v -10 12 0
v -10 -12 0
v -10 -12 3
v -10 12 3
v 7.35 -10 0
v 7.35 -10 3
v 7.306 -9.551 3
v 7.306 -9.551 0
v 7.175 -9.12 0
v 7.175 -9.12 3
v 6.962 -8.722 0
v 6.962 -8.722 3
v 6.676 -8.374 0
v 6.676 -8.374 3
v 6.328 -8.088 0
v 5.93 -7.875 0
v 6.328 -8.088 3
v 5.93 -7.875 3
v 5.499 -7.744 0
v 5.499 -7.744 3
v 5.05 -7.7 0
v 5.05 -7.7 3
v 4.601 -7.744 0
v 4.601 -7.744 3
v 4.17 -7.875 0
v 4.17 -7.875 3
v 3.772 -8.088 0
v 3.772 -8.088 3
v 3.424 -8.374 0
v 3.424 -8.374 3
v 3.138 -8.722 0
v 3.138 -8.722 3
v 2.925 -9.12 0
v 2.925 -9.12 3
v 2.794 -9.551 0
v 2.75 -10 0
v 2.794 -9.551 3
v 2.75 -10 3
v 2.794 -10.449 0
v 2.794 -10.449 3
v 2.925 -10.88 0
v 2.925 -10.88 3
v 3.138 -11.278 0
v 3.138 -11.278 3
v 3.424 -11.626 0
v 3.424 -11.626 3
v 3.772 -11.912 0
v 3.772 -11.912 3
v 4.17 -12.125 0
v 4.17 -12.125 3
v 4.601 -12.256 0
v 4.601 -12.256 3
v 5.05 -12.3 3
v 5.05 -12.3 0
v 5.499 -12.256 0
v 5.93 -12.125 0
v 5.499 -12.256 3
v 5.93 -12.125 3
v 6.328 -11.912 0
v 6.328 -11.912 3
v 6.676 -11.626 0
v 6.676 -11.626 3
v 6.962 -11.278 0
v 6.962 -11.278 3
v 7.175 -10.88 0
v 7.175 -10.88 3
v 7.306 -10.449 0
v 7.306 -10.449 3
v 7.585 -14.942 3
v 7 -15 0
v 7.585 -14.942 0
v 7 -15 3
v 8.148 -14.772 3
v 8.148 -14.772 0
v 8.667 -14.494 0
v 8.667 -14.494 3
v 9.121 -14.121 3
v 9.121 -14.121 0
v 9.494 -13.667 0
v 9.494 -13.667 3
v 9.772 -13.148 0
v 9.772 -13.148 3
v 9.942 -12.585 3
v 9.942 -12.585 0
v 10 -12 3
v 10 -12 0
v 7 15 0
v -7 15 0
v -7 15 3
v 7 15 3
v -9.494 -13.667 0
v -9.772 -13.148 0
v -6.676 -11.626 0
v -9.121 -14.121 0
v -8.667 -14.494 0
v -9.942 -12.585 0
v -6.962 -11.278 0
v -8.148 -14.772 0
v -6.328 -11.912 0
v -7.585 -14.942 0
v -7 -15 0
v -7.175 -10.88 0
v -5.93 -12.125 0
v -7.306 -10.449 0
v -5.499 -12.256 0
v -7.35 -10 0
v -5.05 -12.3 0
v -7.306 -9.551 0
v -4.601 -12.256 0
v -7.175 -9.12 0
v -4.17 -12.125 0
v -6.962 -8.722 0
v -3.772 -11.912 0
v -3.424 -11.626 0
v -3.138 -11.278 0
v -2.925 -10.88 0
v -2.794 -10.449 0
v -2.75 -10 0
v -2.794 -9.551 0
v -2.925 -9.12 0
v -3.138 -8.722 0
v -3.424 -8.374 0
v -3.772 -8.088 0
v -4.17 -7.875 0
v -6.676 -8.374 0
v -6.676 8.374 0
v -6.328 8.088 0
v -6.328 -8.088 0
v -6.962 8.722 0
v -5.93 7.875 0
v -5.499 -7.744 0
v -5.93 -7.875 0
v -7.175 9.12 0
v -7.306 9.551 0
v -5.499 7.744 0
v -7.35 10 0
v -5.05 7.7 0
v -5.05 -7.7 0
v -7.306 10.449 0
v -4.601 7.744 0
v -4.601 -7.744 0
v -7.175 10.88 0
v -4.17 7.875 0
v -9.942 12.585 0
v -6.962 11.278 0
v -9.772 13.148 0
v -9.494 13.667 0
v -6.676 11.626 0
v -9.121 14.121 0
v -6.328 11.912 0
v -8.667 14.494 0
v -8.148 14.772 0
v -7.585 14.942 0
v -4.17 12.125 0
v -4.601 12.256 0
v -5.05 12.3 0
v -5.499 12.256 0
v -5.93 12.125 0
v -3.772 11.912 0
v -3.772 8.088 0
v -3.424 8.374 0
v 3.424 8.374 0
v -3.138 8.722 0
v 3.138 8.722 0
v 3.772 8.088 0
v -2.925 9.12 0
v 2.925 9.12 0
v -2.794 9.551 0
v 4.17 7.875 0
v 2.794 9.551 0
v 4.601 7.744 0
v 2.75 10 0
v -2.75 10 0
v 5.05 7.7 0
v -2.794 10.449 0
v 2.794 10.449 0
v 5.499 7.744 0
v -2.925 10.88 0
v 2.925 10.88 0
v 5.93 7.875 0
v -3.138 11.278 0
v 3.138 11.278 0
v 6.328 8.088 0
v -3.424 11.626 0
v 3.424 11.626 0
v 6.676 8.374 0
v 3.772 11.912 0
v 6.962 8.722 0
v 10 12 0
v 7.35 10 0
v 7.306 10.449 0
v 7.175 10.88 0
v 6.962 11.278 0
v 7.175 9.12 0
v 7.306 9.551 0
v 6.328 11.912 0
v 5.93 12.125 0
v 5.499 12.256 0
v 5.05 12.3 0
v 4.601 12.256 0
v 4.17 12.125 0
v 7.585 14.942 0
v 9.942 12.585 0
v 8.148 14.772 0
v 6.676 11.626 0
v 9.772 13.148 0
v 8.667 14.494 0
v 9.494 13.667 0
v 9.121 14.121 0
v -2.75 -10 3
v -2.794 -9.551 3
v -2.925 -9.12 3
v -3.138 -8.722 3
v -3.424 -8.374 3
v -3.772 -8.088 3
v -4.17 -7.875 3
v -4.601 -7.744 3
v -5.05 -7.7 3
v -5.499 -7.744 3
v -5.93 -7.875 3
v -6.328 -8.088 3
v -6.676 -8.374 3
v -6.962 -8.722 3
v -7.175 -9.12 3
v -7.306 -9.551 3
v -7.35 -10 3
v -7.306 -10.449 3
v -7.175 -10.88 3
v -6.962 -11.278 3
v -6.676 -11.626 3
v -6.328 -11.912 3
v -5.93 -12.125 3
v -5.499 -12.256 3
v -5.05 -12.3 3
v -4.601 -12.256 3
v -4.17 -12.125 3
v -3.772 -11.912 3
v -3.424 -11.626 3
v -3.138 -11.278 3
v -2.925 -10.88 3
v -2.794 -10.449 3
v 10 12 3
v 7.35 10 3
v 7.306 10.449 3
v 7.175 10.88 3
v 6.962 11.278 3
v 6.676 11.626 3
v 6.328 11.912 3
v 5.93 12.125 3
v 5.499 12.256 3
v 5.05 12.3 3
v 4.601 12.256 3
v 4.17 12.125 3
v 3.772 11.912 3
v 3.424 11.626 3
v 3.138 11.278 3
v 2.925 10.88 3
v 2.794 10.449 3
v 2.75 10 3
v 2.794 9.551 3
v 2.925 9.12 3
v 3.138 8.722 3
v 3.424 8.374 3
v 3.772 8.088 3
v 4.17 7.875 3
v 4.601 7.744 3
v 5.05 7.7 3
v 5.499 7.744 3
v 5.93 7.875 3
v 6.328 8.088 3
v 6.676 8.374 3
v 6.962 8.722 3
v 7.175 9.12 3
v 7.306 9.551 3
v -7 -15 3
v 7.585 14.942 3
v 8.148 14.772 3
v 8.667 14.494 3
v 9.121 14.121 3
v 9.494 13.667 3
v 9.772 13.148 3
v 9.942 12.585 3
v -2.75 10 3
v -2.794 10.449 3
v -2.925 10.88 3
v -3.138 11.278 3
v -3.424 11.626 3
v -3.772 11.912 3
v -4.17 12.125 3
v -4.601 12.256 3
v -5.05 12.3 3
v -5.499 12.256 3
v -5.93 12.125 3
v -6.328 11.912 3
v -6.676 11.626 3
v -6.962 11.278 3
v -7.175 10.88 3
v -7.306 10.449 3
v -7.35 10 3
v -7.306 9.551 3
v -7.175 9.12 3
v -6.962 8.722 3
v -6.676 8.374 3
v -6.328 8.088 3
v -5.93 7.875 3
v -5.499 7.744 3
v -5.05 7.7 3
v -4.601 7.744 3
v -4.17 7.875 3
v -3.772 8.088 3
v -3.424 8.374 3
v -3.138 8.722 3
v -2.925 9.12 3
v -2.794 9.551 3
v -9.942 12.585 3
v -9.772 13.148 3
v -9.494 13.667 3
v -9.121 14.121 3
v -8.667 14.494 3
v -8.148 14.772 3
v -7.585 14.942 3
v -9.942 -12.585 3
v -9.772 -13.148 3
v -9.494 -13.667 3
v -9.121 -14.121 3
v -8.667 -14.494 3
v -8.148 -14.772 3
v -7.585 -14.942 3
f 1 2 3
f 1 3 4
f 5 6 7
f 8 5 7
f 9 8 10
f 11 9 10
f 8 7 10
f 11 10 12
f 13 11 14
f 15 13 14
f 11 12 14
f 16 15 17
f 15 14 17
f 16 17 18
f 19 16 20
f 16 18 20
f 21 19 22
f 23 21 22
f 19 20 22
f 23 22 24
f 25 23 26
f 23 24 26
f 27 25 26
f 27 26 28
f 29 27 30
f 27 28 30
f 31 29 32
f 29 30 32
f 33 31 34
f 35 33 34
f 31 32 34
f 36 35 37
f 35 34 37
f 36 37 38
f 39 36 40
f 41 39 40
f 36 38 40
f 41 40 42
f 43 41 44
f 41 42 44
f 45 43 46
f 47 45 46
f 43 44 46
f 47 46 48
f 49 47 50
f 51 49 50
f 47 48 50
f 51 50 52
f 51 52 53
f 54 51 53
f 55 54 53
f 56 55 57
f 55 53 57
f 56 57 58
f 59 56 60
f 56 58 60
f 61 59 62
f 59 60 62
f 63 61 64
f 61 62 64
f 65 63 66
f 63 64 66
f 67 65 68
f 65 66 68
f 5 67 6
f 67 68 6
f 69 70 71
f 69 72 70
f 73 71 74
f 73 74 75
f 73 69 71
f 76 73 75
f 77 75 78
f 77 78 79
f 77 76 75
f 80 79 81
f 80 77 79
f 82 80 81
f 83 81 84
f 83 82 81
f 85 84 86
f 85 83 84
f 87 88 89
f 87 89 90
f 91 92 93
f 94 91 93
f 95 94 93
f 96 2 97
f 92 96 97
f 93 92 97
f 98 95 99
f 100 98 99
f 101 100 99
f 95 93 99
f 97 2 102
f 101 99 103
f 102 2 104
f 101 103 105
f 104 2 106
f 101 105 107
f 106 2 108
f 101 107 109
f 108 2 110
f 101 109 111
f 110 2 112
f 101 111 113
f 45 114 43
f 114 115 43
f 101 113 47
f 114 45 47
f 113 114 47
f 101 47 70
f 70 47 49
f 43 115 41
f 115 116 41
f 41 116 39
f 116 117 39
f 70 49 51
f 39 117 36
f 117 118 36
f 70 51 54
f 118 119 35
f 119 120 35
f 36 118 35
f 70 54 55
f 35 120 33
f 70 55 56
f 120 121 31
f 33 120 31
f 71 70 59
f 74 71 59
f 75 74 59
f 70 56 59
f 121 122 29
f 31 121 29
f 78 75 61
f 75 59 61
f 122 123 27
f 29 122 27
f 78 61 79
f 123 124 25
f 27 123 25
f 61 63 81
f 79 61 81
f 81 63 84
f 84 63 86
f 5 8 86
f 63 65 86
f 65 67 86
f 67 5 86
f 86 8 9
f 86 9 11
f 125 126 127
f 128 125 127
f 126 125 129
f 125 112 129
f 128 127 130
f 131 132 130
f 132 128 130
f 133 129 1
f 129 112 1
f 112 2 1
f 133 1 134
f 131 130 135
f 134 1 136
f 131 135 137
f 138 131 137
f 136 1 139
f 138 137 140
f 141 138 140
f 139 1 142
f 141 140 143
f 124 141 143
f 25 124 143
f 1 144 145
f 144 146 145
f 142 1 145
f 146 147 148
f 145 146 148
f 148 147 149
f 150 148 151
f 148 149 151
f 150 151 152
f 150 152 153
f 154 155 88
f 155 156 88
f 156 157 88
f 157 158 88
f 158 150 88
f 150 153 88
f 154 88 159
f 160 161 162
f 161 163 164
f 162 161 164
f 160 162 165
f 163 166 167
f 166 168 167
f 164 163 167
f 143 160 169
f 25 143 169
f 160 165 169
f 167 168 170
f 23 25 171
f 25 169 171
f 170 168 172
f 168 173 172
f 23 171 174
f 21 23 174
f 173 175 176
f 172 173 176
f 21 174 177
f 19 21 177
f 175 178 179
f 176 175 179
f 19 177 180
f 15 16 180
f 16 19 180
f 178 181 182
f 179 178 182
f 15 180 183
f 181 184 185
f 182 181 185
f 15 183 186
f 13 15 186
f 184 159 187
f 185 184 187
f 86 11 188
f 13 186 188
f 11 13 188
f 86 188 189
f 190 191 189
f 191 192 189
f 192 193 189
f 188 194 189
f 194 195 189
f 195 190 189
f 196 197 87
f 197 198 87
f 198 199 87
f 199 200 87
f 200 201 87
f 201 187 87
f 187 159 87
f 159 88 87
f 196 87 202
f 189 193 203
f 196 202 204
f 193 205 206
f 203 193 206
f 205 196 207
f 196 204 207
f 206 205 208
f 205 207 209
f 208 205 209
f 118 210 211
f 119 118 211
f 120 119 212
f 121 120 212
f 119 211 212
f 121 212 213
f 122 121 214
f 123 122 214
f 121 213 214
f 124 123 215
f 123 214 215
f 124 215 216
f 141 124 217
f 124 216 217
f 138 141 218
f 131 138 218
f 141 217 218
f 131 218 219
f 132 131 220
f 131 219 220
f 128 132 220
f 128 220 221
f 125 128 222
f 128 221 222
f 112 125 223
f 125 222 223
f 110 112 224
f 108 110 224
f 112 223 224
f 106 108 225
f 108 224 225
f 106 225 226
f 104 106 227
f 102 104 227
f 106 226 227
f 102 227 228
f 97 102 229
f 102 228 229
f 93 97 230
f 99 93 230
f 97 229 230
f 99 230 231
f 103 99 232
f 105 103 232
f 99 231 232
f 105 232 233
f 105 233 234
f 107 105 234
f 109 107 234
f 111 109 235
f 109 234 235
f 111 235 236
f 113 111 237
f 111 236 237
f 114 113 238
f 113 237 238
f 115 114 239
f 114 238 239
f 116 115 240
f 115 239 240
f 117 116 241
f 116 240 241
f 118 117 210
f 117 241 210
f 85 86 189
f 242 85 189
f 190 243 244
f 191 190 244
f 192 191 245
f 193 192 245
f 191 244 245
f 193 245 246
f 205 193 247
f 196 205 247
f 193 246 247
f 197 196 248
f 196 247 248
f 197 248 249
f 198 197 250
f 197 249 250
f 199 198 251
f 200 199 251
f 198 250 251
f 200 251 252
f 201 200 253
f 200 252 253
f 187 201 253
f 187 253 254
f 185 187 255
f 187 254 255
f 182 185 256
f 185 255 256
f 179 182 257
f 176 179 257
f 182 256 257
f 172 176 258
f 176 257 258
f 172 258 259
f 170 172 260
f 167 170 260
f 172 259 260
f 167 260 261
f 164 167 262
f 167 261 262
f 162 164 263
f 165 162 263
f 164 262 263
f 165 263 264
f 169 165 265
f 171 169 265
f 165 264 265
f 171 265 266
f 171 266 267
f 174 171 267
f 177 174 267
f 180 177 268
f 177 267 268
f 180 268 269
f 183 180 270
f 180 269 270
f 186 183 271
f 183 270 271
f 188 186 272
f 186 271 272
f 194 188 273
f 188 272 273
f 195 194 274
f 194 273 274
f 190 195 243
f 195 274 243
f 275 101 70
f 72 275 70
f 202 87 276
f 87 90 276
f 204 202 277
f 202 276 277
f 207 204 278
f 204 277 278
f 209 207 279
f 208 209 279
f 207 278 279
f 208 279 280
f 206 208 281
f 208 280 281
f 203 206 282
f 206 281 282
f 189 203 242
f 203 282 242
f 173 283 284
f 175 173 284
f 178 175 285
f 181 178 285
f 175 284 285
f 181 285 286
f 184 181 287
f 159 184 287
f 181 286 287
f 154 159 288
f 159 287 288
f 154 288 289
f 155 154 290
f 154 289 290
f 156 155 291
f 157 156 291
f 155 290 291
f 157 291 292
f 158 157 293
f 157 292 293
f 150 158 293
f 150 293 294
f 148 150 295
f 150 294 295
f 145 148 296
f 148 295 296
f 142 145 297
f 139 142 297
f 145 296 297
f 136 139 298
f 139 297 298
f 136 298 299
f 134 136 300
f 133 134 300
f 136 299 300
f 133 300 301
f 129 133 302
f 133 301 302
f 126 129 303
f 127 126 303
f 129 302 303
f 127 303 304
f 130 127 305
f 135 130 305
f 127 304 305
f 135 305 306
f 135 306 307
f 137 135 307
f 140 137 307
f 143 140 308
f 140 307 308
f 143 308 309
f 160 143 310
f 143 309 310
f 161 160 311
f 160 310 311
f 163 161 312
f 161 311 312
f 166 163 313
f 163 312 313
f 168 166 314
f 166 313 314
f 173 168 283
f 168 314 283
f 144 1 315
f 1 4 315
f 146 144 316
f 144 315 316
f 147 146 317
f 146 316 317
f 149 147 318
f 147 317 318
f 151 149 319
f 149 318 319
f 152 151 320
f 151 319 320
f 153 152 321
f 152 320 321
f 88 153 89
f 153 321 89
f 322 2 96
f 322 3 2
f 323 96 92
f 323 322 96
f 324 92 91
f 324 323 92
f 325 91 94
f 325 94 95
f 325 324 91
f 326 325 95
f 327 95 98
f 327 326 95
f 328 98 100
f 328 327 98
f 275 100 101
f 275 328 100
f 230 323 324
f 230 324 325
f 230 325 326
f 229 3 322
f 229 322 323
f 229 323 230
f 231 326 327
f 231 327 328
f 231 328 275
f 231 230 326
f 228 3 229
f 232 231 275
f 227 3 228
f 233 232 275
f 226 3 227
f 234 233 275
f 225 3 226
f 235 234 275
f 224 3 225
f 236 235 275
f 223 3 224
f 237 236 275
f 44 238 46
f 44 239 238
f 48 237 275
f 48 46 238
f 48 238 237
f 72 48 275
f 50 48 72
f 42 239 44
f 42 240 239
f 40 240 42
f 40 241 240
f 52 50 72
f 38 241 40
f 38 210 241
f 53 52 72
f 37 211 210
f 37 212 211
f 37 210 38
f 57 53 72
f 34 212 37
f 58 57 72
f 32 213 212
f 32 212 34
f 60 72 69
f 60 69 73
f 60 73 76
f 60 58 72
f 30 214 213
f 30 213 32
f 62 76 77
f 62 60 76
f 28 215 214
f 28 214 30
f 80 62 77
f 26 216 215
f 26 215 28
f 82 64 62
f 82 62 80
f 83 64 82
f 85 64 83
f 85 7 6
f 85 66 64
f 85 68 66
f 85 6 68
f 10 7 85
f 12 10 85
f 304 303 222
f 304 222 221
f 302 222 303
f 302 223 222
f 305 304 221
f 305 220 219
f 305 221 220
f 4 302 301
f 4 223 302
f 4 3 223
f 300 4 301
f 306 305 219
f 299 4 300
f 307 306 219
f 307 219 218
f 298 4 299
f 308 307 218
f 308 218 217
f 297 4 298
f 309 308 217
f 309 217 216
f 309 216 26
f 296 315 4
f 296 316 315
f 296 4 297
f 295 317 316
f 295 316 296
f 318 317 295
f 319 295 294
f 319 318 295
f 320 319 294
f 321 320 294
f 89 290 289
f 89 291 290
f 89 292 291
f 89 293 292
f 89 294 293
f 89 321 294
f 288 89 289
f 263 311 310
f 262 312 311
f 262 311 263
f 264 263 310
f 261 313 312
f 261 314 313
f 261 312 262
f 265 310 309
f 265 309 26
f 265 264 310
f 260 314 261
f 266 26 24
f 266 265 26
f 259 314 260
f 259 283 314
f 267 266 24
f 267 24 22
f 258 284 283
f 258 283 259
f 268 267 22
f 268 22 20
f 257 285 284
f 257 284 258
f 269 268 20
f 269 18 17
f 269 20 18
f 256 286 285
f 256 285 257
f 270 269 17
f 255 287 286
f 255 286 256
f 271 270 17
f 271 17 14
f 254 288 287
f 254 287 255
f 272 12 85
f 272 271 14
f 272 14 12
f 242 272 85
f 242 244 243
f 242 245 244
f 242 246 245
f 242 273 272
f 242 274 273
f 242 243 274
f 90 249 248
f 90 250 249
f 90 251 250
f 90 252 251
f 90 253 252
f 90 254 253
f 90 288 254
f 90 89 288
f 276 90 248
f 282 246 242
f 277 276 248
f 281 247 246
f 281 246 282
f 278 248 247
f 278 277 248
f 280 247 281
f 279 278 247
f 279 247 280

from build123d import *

# Parameters (mm, degrees)
SKETCH1_W           = 20
SKETCH1_H           = 30
BOSS_EXTRUDE1_DEPTH = 3
SKETCH2_R           = 2.3
CUT_EXTRUDE1_DEPTH  = 3
FILLET1_R           = 3


with BuildPart() as part:
    # Sketch1 → Boss-Extrude1 (new body)
    with BuildSketch(Plane.XY):
        Rectangle(SKETCH1_W, SKETCH1_H)
    extrude(amount=BOSS_EXTRUDE1_DEPTH)

    # Sketch2 → Cut-Extrude1 (cut)
    with BuildSketch(Plane.XY.offset(3)):
        with Locations((-5.05, 10)):
            Circle(SKETCH2_R)
        with Locations((5.05, 10)):
            Circle(SKETCH2_R)
        with Locations((-5.05, -10)):
            Circle(SKETCH2_R)
        with Locations((5.05, -10)):
            Circle(SKETCH2_R)
    extrude(amount=-CUT_EXTRUDE1_DEPTH, mode=Mode.SUBTRACT)

    # Fillet1
    fillet1_edges = [part.edges().sort_by_distance(p)[0] for p in [
        (10, -15, 1.5),
        (-10, -15, 1.5),
        (-10, 15, 1.5),
        (10, 15, 1.5),
    ]]
    fillet(fillet1_edges, radius=FILLET1_R)


solid = part.part
